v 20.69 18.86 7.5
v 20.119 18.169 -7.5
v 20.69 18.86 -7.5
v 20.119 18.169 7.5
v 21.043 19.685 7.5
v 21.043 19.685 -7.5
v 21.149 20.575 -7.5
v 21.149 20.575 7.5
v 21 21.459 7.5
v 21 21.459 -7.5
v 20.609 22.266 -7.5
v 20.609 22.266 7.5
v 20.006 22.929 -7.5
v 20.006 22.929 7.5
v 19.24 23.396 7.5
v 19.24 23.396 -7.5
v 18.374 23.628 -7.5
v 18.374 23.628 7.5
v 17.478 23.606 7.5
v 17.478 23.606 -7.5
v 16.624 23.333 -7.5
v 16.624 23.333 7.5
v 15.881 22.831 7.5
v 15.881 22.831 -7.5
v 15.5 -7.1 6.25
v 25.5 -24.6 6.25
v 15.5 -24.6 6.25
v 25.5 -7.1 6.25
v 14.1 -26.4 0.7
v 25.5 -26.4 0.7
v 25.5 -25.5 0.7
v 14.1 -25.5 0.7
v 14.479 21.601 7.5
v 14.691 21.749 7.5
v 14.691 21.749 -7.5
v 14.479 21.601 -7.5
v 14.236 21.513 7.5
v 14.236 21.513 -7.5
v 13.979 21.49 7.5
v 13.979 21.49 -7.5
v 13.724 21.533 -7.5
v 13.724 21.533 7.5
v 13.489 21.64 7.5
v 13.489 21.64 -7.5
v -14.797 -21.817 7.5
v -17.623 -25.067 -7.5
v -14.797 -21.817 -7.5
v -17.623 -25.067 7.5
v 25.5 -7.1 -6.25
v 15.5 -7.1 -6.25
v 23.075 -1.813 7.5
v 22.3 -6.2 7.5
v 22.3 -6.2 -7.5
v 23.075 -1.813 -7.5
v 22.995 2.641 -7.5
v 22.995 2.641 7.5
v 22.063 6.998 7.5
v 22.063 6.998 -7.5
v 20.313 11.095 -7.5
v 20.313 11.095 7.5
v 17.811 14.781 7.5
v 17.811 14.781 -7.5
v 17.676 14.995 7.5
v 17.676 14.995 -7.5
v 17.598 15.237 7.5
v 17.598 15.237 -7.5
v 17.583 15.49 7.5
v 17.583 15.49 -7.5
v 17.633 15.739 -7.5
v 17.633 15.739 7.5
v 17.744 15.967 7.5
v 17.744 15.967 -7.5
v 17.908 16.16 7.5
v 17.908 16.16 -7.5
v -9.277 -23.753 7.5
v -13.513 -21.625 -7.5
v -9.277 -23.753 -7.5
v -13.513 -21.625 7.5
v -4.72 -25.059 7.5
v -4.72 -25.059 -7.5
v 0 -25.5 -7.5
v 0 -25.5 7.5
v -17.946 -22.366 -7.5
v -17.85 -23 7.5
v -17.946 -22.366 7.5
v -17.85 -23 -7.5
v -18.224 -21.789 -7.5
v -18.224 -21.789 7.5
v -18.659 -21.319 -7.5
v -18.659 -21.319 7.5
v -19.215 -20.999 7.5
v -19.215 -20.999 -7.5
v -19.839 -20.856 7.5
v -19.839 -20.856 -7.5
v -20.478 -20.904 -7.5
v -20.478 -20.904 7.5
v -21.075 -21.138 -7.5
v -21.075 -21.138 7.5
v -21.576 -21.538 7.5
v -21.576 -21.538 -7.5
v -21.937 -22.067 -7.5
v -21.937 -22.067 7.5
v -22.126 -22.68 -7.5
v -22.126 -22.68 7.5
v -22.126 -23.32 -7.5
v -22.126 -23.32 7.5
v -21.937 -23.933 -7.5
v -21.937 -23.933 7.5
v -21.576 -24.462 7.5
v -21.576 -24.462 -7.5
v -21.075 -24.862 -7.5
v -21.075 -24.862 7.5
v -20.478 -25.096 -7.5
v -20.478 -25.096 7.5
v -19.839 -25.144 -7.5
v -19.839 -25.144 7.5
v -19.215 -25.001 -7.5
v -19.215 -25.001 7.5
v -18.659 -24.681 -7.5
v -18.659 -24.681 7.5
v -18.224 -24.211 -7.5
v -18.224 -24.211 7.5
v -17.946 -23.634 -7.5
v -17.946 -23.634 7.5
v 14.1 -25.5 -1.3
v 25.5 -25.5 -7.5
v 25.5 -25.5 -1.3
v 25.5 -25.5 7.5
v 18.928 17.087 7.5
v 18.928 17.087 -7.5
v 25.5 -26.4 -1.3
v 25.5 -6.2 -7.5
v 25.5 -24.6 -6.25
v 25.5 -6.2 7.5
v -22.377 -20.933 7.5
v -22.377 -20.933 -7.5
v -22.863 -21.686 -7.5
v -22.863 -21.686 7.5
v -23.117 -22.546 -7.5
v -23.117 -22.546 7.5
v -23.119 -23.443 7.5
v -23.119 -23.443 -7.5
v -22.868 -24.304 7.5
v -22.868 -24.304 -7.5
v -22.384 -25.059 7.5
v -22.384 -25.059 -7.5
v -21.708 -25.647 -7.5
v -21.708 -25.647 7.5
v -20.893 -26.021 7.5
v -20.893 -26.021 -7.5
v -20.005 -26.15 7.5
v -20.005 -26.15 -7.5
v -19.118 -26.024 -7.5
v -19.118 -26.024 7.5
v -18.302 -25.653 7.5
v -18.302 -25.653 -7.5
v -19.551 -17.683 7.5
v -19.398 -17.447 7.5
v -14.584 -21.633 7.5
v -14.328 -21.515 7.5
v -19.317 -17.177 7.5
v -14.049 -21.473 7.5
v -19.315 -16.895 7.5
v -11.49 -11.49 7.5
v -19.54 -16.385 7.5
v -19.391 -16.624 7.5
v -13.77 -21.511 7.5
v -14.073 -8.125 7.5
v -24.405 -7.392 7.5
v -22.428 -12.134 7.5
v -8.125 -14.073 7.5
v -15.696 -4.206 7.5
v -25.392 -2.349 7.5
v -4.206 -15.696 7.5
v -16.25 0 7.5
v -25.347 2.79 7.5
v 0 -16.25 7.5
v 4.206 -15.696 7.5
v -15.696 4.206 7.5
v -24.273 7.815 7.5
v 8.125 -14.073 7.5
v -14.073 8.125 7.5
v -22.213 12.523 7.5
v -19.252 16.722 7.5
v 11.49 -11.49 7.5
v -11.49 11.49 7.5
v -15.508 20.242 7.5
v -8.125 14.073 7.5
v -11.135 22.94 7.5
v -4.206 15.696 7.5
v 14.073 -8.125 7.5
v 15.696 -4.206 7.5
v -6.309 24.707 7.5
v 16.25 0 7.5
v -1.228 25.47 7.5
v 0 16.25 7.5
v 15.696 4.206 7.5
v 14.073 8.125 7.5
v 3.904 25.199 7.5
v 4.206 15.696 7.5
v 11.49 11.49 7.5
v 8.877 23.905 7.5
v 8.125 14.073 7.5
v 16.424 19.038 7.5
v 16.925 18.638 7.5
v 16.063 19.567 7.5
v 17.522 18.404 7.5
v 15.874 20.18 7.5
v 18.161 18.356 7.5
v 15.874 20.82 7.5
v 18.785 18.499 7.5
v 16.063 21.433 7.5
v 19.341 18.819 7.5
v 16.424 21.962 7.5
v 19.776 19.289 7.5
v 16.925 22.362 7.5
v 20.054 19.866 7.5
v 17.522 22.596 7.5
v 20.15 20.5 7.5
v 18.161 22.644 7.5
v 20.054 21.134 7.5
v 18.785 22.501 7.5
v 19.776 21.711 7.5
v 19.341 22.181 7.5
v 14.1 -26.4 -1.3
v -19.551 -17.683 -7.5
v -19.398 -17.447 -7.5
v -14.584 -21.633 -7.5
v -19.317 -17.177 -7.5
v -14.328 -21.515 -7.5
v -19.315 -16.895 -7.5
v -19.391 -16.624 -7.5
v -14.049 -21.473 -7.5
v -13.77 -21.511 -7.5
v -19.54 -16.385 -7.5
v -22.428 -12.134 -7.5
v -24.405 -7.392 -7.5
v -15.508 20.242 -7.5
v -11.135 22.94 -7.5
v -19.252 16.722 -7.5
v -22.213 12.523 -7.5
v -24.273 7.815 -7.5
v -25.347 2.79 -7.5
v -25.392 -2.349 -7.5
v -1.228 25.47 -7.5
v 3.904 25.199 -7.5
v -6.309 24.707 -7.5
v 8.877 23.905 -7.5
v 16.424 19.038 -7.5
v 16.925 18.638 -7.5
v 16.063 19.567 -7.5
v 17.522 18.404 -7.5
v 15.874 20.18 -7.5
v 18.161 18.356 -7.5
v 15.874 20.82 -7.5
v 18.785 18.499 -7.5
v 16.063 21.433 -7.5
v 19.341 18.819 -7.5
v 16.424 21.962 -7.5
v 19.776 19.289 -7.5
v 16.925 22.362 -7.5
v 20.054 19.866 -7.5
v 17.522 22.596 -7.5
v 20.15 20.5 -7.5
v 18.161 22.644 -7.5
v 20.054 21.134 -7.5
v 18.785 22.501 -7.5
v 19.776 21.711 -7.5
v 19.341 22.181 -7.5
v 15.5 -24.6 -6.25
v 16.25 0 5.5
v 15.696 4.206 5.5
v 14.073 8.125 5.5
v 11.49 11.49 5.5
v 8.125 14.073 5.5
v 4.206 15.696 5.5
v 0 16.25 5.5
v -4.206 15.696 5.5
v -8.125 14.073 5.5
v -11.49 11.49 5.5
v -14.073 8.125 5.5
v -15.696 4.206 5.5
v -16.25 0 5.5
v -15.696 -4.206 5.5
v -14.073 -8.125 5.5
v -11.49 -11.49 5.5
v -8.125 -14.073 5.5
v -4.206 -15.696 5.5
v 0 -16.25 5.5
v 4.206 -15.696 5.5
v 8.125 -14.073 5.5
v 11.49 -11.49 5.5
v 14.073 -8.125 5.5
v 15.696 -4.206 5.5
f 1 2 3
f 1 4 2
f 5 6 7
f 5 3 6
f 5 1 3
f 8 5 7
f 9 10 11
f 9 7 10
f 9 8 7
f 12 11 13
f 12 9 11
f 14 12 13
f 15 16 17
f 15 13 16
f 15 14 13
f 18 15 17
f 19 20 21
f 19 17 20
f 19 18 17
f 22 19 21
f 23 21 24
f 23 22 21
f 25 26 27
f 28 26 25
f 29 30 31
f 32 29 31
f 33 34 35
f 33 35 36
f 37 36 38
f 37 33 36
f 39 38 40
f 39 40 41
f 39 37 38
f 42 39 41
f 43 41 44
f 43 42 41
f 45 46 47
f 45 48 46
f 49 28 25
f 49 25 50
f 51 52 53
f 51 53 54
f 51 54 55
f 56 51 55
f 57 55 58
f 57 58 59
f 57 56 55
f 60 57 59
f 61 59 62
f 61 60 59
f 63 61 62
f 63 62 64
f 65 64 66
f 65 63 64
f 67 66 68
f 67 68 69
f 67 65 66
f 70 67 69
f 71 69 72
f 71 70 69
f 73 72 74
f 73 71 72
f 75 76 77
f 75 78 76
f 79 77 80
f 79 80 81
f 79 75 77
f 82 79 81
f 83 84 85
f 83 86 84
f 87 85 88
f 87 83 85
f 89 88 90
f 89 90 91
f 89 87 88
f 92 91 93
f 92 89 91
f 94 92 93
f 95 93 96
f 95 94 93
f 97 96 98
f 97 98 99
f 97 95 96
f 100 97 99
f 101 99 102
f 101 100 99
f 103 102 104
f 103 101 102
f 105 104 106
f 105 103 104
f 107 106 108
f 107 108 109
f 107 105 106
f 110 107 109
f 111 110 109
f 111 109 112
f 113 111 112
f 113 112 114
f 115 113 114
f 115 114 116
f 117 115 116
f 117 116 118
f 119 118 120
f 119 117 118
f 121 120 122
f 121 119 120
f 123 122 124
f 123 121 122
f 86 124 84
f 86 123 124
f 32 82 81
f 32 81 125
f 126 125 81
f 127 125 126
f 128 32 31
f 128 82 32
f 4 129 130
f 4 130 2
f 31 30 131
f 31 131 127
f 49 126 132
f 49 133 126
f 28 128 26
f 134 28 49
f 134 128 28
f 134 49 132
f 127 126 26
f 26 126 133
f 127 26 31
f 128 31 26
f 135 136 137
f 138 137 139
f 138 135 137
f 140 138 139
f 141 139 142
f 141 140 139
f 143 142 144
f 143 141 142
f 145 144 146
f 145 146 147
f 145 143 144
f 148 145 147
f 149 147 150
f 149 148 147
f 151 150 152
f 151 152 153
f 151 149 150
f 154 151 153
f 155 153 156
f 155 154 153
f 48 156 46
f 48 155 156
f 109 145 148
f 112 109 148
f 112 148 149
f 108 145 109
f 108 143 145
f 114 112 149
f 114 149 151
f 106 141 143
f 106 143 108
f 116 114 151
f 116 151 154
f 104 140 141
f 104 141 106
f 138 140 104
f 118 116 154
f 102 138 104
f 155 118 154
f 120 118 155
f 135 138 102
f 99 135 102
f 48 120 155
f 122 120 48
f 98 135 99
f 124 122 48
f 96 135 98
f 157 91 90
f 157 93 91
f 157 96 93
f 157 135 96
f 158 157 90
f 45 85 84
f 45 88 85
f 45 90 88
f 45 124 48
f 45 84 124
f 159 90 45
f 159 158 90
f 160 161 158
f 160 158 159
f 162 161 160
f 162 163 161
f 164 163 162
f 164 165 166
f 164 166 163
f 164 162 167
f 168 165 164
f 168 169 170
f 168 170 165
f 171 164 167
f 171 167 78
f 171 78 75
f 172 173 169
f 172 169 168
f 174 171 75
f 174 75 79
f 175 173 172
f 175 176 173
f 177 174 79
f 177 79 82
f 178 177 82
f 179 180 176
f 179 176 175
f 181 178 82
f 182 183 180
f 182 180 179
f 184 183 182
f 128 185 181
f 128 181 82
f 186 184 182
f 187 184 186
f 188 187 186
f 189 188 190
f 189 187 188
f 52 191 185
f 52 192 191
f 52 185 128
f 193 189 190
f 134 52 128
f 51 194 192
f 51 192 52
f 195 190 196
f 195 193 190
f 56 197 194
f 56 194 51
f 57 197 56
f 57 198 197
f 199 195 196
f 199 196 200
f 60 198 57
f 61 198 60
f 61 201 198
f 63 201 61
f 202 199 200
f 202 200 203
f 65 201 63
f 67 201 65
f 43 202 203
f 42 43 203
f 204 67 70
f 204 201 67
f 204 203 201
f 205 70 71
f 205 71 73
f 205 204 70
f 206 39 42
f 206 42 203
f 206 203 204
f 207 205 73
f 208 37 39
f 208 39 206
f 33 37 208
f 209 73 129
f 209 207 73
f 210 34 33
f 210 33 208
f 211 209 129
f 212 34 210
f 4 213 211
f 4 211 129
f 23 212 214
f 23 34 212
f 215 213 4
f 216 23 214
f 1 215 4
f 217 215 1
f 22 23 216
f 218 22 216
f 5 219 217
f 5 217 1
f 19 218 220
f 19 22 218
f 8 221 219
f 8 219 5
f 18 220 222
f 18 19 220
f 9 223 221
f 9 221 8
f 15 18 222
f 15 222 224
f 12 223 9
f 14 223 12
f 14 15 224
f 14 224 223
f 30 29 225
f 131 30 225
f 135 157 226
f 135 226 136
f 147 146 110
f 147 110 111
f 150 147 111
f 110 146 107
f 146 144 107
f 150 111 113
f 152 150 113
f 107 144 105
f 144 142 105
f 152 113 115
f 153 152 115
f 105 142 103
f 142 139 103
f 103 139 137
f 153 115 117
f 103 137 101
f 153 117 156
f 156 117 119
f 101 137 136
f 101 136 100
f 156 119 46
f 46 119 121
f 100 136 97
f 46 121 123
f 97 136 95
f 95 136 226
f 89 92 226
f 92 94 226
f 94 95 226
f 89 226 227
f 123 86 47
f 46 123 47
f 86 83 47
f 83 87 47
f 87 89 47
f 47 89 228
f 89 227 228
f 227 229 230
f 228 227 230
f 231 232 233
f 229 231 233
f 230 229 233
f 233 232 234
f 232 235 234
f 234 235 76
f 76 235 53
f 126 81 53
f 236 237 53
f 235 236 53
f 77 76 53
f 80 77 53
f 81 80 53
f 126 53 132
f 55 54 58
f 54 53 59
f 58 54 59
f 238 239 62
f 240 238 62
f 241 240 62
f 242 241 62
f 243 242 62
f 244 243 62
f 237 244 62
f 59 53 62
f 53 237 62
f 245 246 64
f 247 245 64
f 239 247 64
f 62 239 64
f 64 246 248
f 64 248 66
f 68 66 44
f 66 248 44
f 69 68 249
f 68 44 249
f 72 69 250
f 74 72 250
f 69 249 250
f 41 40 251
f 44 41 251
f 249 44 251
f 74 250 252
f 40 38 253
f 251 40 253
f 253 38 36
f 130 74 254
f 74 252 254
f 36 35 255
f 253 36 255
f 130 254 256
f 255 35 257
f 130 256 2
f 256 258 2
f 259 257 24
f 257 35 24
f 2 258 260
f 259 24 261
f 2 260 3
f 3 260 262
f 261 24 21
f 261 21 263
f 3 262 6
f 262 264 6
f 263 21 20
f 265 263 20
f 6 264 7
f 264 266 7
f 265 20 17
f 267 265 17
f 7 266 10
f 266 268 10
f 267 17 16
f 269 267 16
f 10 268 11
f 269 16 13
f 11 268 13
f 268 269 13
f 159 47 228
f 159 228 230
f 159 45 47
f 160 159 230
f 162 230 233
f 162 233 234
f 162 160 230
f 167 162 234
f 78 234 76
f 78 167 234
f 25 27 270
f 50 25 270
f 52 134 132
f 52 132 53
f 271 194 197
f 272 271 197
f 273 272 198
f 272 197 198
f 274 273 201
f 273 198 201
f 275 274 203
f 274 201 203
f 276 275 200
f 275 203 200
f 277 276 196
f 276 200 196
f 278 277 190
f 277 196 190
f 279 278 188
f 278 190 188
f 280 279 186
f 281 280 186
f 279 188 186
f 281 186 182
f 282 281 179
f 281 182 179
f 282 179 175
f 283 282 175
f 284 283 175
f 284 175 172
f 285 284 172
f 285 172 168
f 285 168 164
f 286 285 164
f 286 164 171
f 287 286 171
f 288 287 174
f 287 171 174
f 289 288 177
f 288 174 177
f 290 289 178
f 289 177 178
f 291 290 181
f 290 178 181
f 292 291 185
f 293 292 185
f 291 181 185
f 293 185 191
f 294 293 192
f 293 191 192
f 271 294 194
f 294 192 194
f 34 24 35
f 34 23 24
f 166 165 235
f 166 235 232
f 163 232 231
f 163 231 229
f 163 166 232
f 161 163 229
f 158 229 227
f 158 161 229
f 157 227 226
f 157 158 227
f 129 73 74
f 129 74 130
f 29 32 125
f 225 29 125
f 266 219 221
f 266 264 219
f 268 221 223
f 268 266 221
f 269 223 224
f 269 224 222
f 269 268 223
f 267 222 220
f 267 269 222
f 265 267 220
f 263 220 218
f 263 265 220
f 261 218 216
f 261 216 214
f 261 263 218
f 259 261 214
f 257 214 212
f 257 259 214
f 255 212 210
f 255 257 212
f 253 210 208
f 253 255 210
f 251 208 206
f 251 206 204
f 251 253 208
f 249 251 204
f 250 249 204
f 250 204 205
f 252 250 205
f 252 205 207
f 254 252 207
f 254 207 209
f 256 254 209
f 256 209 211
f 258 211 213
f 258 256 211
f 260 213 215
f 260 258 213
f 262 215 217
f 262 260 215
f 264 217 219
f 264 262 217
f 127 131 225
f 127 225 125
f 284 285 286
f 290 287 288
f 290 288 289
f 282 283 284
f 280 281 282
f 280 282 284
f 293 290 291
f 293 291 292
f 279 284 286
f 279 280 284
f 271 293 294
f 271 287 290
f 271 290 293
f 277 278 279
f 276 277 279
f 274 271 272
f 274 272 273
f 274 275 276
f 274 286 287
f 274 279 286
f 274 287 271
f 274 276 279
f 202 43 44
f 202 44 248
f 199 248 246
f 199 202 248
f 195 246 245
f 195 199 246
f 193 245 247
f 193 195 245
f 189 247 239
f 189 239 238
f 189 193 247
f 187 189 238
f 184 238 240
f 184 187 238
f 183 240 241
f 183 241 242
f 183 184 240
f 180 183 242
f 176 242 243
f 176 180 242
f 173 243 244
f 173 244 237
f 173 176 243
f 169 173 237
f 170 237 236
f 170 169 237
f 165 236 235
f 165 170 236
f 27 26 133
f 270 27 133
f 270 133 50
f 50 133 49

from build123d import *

# Parameters (mm, degrees)
SKETCH1_R           = 3.15
SKETCH1_R_2         = 2.15
BOSS_EXTRUDE1_DEPTH = 7.5
SKETCH3_W           = 2
SKETCH3_H           = 0.9
BOSS_EXTRUDE2_DEPTH = 11.4
SKETCH4_R           = 16.25
CUT_EXTRUDE1_DEPTH  = 2
SKETCH5_W           = 12.5
SKETCH5_H           = 17.5
CUT_EXTRUDE2_DEPTH  = 10


with BuildPart() as part:
    # Sketch1 → Boss-Extrude1 (new, symmetric)
    # profile 1 of 5: a face of its own
    with BuildSketch(Plane.XY):
        with BuildLine():
            ThreePointArc((-13.512663894, -21.625399753), (-7.028595389, -24.512218318), (0, -25.5))
            Line((0, -25.5), (0, -6.2))
            Line((0, -6.2), (22.3, -6.2))
            ThreePointArc((22.3, -6.2), (22.633696889, 4.842082728), (17.811452389, 14.781142168))
            ThreePointArc((17.811452389, 14.781142168), (17.583444291, 15.489857701), (17.908337826, 16.159715588))
            Line((17.908337826, 16.159715588), (18.928412767, 17.086988913))
            Line((18.928412767, 17.086988913), (20.118834813, 18.169111965))
            ThreePointArc((20.118834813, 18.169111965), (15.669111965, 18.381165187), (15.881165187, 22.830888035))
            Line((15.881165187, 22.830888035), (14.69074314, 21.748764984))
            ThreePointArc((14.69074314, 21.748764984), (14.108162444, 21.492793575), (13.489112369, 21.64009814))
            ThreePointArc((13.489112369, 21.64009814), (-19.251546311, 16.722080152), (-19.539541583, -16.384636545))
            ThreePointArc((-19.539541583, -16.384636545), (-19.305838355, -17.036142145), (-19.551192594, -17.683350027))
            Line((-19.551192594, -17.683350027), (-22.377007395, -20.933037048))
            ThreePointArc((-22.377007395, -20.933037048), (-18.896612782, -20.049570091), (-16.85, -23))
            ThreePointArc((-16.85, -23), (-17.049570091, -24.103387218), (-17.622992605, -25.066962952))
            Line((-17.622992605, -25.066962952), (-14.797177804, -21.817275931))
            ThreePointArc((-14.797177804, -21.817275931), (-14.190309608, -21.484428012), (-13.512663894, -21.625399753))
        make_face()
    # profile 2 of 5: a face of its own
    with BuildSketch(Plane.XY):
        with Locations((-20, -23)):
            Circle(SKETCH1_R)
        with Locations((-20, -23)):
            Circle(SKETCH1_R_2, mode=Mode.SUBTRACT)
    # profile 3 of 5: a face of its own
    with BuildSketch(Plane.XY):
        with Locations((18, 20.5)):
            Circle(SKETCH1_R)
        with Locations((18, 20.5)):
            Circle(SKETCH1_R_2, mode=Mode.SUBTRACT)
    # profile 4 of 5: a face of its own
    with BuildSketch(Plane.XY):
        with BuildLine():
            Line((0, -6.2), (0, -25.5))
            ThreePointArc((0, -25.5), (15.686777872, -20.104104059), (24.734793308, -6.2))
            Line((24.734793308, -6.2), (22.3, -6.2))
            Line((22.3, -6.2), (0, -6.2))
        make_face()
    # profile 5 of 5: a face of its own
    with BuildSketch(Plane.XY):
        with BuildLine():
            Line((0, -25.5), (25.5, -25.5))
            Line((25.5, -25.5), (25.5, -6.2))
            Line((25.5, -6.2), (24.734793308, -6.2))
            ThreePointArc((24.734793308, -6.2), (15.686777872, -20.104104059), (0, -25.5))
        make_face()
    extrude(amount=BOSS_EXTRUDE1_DEPTH, both=True)

    # Sketch3 → Boss-Extrude2 (add)
    with BuildSketch(Plane(origin=(25.5, 0, 0), x_dir=(0, 0, -1), z_dir=(1, 0, 0))):
        with Locations((0.3, -25.95)):
            Rectangle(SKETCH3_W, SKETCH3_H)
    extrude(amount=-BOSS_EXTRUDE2_DEPTH)

    # Sketch4 → Cut-Extrude1 (cut)
    with BuildSketch(Plane.XY.offset(7.5)):
        Circle(SKETCH4_R)
    extrude(amount=-CUT_EXTRUDE1_DEPTH, mode=Mode.SUBTRACT)

    # Sketch5 → Cut-Extrude2 (cut)
    with BuildSketch(Plane(origin=(25.5, 0, 0), x_dir=(0, 0, -1), z_dir=(1, 0, 0))):
        with Locations((0, -15.85)):
            Rectangle(SKETCH5_W, SKETCH5_H)
    extrude(amount=-CUT_EXTRUDE2_DEPTH, mode=Mode.SUBTRACT)


solid = part.part
